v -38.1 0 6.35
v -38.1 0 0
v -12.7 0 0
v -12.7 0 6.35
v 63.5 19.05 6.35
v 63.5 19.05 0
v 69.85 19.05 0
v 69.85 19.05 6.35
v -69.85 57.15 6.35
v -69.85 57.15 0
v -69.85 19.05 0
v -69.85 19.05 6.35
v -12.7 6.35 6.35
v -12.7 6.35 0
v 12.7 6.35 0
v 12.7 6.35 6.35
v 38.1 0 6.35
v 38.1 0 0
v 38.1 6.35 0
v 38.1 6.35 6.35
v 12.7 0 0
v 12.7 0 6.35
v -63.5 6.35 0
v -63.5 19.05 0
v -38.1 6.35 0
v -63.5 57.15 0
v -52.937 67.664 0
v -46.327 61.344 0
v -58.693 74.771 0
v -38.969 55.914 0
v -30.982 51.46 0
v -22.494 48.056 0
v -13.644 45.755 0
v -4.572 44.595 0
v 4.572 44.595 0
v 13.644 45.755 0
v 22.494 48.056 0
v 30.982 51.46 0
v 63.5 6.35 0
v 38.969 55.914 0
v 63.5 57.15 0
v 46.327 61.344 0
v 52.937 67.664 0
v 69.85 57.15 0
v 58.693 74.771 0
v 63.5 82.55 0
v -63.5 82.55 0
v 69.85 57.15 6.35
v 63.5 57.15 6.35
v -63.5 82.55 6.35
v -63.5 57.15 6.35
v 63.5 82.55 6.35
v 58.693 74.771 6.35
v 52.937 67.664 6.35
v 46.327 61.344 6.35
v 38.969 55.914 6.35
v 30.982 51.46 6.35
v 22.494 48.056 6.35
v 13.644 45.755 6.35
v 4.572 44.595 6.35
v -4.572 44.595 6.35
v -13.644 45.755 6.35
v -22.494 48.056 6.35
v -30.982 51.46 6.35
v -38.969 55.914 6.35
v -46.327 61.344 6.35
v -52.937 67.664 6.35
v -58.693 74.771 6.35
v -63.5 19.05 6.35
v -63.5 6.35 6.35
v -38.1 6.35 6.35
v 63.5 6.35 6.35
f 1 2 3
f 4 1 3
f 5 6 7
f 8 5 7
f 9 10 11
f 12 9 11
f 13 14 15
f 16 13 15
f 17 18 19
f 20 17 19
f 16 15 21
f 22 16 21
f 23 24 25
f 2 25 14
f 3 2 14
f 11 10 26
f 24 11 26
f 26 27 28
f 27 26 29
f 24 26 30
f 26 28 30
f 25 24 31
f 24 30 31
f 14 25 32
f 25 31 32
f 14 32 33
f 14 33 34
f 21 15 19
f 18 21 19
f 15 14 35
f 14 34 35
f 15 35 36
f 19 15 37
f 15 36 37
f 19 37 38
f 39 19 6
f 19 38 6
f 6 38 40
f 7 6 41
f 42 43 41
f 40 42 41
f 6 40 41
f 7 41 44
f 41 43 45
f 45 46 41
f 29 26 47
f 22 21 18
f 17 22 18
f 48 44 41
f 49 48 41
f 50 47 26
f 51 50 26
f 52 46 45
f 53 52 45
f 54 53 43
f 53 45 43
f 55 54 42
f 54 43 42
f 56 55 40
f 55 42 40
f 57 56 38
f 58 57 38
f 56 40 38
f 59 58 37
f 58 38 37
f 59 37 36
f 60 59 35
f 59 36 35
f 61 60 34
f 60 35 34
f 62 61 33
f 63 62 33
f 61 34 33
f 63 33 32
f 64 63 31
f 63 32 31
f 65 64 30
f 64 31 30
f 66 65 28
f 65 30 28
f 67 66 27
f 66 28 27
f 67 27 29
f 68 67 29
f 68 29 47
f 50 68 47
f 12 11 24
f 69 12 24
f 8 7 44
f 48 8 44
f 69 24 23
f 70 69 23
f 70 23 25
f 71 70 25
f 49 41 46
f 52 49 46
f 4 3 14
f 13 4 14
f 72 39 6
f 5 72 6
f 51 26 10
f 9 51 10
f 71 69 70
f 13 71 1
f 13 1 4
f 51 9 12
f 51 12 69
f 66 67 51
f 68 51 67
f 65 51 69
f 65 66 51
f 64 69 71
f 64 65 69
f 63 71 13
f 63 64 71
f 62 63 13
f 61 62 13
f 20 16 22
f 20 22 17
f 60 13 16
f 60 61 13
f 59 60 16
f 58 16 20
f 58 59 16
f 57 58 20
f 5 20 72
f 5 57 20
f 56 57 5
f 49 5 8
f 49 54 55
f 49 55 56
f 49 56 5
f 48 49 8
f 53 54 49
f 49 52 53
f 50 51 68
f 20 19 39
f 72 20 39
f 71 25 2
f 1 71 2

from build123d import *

# Parameters (mm, degrees)
BOSS_EXTRUDE1_DEPTH = 6.35


with BuildPart() as part:
    # Sketch1 → Boss-Extrude1 (new body)
    with BuildSketch(Plane.XY):
        with BuildLine():
            Line((63.5, 6.35), (63.5, 19.05))
            Line((63.5, 19.05), (69.85, 19.05))
            Line((69.85, 19.05), (69.85, 57.15))
            Line((69.85, 57.15), (63.5, 57.15))
            Line((63.5, 57.15), (63.5, 82.55))
            ThreePointArc((63.5, 82.55), (0, 44.45), (-63.5, 82.55))
            Line((-63.5, 82.55), (-63.5, 57.15))
            Line((-63.5, 57.15), (-69.85, 57.15))
            Line((-69.85, 57.15), (-69.85, 19.05))
            Line((-69.85, 19.05), (-63.5, 19.05))
            Line((-63.5, 19.05), (-63.5, 6.35))
            Line((-63.5, 6.35), (-38.1, 6.35))
            Line((-38.1, 6.35), (-38.1, 0))
            Line((-38.1, 0), (-12.7, 0))
            Line((-12.7, 0), (-12.7, 6.35))
            Line((-12.7, 6.35), (12.7, 6.35))
            Line((12.7, 6.35), (12.7, 0))
            Line((12.7, 0), (38.1, 0))
            Line((38.1, 0), (38.1, 6.35))
            Line((38.1, 6.35), (63.5, 6.35))
        make_face()
    extrude(amount=BOSS_EXTRUDE1_DEPTH)


solid = part.part
